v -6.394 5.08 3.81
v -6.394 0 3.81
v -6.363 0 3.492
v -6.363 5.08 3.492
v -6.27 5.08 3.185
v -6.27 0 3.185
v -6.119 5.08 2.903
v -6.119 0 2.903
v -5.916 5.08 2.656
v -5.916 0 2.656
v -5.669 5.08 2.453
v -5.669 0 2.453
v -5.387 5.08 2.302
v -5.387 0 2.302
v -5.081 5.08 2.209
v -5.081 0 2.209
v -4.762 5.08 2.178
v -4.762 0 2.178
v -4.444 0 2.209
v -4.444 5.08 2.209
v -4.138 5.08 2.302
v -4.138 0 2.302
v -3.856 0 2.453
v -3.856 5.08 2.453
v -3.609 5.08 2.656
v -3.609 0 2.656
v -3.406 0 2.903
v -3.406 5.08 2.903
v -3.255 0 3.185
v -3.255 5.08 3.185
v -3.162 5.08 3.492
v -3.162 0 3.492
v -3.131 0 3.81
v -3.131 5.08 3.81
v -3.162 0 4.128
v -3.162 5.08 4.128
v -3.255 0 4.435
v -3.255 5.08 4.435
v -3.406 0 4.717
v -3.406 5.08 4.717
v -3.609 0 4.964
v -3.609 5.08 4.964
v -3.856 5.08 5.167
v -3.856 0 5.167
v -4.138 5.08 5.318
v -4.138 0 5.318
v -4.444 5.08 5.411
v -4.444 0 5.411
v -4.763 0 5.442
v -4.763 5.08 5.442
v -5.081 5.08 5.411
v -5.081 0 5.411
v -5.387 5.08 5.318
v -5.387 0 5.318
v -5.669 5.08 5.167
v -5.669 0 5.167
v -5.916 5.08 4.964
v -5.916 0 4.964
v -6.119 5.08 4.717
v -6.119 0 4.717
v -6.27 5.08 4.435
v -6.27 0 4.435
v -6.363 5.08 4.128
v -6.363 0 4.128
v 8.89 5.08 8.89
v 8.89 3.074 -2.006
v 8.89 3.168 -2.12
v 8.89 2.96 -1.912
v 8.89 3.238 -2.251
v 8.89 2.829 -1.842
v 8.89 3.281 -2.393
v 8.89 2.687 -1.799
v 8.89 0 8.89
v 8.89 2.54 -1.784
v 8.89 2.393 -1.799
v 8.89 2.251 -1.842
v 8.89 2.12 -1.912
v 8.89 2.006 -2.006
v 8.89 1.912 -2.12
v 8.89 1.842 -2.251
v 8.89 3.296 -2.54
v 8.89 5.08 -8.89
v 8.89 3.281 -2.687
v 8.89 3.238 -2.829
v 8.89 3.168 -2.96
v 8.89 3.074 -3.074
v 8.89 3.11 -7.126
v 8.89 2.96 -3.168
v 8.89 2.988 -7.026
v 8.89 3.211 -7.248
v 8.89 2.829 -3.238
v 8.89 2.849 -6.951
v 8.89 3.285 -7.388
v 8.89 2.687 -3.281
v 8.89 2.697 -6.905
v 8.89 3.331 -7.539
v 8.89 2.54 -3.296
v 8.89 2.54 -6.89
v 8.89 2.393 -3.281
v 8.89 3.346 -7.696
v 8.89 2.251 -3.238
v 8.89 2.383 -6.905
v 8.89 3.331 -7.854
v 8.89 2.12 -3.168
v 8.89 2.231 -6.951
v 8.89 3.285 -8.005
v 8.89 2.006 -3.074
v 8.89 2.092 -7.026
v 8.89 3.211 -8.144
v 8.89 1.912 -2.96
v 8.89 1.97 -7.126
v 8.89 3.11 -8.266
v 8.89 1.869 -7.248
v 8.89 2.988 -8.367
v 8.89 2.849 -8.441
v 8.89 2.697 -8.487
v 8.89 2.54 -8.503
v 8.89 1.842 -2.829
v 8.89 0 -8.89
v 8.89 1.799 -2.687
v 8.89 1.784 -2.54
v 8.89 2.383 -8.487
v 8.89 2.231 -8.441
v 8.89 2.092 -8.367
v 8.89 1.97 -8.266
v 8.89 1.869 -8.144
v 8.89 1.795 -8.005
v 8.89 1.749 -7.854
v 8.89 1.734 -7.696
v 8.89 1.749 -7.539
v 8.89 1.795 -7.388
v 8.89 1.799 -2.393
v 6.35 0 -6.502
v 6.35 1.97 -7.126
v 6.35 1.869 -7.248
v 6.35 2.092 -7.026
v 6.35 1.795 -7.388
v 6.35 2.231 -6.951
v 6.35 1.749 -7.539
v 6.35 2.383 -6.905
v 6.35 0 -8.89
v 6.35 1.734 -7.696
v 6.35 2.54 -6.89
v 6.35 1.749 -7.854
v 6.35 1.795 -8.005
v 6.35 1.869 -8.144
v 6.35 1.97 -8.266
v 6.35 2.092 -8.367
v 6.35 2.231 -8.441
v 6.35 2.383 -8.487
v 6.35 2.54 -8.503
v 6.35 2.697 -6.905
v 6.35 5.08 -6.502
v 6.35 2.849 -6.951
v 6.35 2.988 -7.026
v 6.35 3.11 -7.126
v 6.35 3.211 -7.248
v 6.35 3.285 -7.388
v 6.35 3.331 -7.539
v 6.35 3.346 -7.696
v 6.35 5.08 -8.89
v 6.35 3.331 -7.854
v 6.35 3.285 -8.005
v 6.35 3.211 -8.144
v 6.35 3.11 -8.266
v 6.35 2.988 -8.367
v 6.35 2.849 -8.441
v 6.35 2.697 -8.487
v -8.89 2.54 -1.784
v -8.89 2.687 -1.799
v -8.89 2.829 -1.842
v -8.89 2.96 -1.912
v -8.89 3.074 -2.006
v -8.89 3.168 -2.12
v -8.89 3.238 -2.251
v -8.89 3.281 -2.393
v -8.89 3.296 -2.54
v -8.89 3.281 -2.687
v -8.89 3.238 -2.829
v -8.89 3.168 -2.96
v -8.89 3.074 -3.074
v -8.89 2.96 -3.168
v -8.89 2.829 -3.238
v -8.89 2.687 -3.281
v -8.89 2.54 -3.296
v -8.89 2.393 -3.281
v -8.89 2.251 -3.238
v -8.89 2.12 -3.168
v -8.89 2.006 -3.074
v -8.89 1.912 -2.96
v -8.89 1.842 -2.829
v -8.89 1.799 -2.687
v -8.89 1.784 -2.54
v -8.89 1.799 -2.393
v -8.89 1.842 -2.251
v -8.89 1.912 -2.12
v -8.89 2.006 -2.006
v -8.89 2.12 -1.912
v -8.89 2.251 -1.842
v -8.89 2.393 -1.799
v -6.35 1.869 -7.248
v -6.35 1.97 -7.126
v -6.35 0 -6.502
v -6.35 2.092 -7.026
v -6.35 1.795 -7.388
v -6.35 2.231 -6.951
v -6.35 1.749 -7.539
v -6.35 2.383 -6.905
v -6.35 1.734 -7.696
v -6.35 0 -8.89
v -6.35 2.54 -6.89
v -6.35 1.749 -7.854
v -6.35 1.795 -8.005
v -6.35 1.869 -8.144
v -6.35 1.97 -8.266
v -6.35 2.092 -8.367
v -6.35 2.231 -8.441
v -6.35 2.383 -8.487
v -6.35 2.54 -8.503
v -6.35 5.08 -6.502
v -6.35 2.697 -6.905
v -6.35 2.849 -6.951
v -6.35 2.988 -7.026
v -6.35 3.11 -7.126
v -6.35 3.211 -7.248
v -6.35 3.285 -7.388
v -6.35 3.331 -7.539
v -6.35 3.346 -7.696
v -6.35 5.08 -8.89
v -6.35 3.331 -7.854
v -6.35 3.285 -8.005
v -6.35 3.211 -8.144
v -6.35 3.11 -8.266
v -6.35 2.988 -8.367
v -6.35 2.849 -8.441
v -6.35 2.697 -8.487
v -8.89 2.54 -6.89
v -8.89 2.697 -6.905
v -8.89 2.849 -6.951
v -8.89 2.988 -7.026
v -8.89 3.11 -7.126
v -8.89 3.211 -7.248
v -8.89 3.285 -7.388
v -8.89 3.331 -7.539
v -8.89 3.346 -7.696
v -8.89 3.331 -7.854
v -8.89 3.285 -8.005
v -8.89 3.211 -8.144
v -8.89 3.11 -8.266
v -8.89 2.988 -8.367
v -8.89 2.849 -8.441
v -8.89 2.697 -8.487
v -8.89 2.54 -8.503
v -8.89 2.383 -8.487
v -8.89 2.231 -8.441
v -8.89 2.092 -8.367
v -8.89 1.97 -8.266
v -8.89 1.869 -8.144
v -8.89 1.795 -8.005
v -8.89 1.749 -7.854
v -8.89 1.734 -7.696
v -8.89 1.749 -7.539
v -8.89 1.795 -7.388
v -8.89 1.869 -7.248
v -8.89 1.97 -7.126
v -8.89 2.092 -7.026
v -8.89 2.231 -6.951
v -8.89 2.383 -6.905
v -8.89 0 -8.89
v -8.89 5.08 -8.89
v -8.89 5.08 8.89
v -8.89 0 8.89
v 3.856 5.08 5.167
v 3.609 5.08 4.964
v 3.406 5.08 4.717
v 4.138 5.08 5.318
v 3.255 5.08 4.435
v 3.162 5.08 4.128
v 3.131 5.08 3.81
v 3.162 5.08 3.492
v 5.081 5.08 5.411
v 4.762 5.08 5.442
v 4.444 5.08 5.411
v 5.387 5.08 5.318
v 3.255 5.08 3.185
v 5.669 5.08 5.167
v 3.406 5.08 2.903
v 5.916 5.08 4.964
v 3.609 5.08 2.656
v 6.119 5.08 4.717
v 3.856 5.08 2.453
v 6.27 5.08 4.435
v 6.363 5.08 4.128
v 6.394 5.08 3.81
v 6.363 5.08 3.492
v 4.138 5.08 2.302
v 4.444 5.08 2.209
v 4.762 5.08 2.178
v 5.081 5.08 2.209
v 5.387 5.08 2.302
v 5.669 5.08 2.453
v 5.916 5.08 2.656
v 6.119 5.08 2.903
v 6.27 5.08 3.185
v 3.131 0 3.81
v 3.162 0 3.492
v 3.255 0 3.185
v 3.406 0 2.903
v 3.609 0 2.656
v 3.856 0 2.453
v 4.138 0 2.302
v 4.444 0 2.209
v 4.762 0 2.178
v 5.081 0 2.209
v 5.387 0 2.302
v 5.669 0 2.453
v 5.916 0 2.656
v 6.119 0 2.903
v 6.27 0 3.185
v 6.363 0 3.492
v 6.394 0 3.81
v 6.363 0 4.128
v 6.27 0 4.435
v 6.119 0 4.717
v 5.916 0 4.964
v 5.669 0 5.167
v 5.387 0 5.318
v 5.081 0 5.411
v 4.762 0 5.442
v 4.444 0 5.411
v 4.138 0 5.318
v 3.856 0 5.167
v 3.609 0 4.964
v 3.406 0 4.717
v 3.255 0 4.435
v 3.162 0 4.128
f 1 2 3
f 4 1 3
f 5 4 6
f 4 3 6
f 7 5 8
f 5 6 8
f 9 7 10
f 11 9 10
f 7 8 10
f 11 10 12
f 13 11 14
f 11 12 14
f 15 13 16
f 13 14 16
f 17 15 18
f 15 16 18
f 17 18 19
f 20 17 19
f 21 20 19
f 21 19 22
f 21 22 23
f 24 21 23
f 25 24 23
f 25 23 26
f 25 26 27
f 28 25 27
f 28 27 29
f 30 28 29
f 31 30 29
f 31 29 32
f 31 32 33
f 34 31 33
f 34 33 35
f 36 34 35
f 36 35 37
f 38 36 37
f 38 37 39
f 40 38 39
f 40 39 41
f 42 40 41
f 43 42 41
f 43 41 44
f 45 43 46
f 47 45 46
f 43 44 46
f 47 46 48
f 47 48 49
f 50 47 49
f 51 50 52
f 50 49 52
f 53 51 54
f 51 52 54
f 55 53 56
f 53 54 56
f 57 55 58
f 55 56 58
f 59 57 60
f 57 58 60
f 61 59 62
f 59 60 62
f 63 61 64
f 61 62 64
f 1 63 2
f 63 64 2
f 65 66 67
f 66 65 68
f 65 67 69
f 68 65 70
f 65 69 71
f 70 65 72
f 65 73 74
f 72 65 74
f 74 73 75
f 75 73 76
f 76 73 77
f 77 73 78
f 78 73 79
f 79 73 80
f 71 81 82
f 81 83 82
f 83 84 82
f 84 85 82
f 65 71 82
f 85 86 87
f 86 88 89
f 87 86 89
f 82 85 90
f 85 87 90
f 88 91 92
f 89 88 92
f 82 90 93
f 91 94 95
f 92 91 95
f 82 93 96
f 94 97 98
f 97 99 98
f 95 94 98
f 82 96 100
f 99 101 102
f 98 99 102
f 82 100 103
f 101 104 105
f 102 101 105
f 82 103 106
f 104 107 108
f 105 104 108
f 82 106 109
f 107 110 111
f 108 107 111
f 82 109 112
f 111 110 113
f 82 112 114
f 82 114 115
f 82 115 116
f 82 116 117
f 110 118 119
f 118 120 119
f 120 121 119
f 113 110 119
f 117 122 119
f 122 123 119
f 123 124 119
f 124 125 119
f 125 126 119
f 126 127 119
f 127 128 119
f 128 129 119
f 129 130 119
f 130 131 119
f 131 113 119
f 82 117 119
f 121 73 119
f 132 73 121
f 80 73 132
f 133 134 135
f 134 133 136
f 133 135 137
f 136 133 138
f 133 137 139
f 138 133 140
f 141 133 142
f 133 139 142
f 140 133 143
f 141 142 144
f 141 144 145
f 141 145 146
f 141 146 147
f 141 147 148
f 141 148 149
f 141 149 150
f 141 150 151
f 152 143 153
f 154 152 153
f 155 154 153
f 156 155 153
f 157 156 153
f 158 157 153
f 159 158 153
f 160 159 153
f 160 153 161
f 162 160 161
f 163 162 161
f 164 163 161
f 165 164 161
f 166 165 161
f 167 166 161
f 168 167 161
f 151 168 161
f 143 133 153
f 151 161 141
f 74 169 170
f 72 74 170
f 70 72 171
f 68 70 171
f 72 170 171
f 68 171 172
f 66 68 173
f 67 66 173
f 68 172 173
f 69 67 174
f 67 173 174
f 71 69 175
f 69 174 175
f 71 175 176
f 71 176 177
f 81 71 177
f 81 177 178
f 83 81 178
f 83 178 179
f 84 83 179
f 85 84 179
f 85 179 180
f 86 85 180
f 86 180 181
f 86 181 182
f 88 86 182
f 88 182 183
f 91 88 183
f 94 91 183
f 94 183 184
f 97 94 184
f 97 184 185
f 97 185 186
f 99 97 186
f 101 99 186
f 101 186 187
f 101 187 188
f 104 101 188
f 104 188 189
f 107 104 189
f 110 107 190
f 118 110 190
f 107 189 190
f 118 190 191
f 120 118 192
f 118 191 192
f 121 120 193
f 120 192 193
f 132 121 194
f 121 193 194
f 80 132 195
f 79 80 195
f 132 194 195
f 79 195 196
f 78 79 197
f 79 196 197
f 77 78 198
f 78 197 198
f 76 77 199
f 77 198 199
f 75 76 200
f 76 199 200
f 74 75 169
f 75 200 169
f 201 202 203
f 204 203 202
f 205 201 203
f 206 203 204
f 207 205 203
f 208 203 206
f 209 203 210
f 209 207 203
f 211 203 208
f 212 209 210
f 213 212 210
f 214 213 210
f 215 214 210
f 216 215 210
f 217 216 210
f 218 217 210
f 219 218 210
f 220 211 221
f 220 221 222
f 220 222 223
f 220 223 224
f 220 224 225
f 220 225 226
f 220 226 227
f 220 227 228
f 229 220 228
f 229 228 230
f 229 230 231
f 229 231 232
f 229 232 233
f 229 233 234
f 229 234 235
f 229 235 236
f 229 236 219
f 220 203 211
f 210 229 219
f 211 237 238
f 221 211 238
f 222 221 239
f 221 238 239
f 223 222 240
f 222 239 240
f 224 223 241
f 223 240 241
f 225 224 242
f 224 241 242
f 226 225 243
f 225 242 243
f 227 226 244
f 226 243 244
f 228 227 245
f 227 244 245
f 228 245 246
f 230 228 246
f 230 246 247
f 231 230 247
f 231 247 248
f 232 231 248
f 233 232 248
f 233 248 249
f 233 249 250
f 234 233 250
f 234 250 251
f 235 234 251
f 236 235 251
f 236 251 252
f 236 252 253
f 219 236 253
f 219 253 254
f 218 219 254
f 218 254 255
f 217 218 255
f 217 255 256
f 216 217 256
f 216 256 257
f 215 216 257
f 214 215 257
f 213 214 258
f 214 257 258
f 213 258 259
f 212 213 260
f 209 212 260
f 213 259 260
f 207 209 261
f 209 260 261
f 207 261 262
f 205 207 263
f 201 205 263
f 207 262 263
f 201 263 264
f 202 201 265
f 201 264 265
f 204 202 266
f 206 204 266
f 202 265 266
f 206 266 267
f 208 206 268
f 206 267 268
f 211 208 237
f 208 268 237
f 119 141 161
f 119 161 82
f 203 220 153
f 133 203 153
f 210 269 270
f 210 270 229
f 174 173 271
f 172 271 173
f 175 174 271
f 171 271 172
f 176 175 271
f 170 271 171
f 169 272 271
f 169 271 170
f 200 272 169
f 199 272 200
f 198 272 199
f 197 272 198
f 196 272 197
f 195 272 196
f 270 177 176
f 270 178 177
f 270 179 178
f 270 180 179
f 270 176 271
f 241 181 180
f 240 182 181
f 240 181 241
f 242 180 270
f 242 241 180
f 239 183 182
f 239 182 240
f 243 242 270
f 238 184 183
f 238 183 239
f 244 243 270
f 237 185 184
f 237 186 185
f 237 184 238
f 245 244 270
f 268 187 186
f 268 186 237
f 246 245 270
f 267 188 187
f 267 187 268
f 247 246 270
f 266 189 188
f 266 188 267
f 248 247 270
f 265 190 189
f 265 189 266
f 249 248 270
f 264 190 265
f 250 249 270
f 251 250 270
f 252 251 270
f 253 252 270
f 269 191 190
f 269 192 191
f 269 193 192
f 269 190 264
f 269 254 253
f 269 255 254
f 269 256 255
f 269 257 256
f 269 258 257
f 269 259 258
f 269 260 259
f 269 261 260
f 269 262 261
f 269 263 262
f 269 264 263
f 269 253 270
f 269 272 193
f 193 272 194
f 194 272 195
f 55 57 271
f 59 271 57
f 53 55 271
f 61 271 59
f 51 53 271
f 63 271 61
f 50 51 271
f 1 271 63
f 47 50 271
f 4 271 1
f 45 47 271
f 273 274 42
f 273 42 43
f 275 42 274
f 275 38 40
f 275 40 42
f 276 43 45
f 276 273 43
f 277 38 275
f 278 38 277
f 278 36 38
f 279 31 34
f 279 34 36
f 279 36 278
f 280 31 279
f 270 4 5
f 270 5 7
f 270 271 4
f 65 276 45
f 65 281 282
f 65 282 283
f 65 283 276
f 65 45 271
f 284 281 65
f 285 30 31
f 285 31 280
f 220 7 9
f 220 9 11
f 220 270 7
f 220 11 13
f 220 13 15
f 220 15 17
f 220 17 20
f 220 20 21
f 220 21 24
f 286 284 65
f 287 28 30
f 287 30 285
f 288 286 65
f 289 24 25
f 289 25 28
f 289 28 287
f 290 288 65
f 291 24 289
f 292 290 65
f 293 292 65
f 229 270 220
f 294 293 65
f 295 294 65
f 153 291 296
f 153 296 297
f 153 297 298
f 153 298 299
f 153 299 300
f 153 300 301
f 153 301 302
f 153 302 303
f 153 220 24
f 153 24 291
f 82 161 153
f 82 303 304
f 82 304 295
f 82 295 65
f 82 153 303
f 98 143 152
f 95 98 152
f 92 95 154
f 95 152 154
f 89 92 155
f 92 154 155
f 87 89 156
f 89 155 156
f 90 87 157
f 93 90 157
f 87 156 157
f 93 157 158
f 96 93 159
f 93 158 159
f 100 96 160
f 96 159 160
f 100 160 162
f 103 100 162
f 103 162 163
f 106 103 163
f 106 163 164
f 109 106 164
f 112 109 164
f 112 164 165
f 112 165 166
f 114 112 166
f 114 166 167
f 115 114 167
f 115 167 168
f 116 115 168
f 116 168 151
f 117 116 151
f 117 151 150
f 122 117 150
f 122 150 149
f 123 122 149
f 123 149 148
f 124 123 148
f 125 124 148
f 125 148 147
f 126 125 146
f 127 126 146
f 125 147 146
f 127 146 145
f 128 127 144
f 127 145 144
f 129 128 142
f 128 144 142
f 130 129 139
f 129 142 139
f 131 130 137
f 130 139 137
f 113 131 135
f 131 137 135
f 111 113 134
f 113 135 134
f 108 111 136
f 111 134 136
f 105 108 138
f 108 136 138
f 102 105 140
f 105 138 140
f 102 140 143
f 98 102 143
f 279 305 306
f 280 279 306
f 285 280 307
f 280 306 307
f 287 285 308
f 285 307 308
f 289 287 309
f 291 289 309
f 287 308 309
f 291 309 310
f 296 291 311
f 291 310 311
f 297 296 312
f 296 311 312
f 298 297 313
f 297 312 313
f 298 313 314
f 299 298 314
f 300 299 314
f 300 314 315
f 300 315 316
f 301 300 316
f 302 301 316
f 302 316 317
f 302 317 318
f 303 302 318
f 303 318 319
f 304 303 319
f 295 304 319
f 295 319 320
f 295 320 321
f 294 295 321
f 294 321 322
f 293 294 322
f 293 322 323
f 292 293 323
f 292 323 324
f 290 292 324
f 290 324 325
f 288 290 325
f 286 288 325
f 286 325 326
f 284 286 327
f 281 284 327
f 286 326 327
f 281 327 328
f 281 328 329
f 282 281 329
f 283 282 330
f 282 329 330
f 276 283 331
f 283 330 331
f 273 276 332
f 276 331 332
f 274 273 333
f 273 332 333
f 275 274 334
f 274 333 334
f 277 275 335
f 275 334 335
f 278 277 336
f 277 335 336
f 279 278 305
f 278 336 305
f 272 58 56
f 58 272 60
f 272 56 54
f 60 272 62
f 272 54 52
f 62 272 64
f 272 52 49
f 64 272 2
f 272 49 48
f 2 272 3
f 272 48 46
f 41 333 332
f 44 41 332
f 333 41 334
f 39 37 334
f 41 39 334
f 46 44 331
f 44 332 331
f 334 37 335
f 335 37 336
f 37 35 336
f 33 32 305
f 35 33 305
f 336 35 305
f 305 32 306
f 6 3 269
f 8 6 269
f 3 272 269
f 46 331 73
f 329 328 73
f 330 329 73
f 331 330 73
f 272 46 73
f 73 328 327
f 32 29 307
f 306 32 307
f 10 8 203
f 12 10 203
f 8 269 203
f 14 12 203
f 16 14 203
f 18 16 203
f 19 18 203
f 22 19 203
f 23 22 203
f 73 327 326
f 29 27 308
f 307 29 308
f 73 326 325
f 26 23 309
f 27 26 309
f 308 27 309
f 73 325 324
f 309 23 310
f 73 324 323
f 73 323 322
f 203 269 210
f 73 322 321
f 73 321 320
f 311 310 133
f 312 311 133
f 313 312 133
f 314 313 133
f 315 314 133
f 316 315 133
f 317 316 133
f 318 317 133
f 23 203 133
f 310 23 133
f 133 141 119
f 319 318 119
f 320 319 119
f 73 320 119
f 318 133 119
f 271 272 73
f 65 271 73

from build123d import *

# Parameters (mm, degrees)
SKETCH1_W             = 17.78
SKETCH1_H             = 17.78
BOSS_EXTRUDE1_DEPTH   = 5.08
SKETCH2_W             = 12.7
SKETCH2_H             = 4.7752
CUT_EXTRUDE1_DEPTH    = 14.55988938
F_4_CLEARANCE_HOLE1_D = 3.2639
F_0_CLEARANCE_HOLE1_D = 1.6129
F_1_72_TAPPED_HOLE1_D = 1.5113


with BuildPart() as part:
    # Sketch1 → Boss-Extrude1 (new body)
    with BuildSketch(Plane(origin=(0, 0, 0), x_dir=(1, 0, 0), z_dir=(0, 1, 0))):
        Rectangle(SKETCH1_W, SKETCH1_H)
    extrude(amount=BOSS_EXTRUDE1_DEPTH)

    # Sketch2 → Cut-Extrude1 (cut, through all)
    with BuildSketch(Plane(origin=(0, 5.08, 0), x_dir=(1, 0, 0), z_dir=(0, 1, 0))):
        with Locations((0, 8.89)):
            Rectangle(SKETCH2_W, SKETCH2_H)
    extrude(amount=-CUT_EXTRUDE1_DEPTH, mode=Mode.SUBTRACT)

    # #4 Clearance Hole1 (through all)
    with Locations(Plane(origin=(0, 5.08, 0), x_dir=(1, 0, 0), z_dir=(0, 1, 0))):
        with Locations((4.7625, -3.81), (-4.7625, -3.81)):
            Hole(F_4_CLEARANCE_HOLE1_D / 2)

    # #0 Clearance Hole1 (through all)
    with Locations(Plane(origin=(8.89, 0, 0), x_dir=(0, 0, -1), z_dir=(1, 0, 0))):
        with Locations((7.6962, 2.54)):
            Hole(F_0_CLEARANCE_HOLE1_D / 2)

    # #1-72 Tapped Hole1 (through all)
    with Locations(Plane(origin=(8.89, 0, 0), x_dir=(0, 0, -1), z_dir=(1, 0, 0))):
        with Locations((2.54, 2.54)):
            Hole(F_1_72_TAPPED_HOLE1_D / 2)


solid = part.part
